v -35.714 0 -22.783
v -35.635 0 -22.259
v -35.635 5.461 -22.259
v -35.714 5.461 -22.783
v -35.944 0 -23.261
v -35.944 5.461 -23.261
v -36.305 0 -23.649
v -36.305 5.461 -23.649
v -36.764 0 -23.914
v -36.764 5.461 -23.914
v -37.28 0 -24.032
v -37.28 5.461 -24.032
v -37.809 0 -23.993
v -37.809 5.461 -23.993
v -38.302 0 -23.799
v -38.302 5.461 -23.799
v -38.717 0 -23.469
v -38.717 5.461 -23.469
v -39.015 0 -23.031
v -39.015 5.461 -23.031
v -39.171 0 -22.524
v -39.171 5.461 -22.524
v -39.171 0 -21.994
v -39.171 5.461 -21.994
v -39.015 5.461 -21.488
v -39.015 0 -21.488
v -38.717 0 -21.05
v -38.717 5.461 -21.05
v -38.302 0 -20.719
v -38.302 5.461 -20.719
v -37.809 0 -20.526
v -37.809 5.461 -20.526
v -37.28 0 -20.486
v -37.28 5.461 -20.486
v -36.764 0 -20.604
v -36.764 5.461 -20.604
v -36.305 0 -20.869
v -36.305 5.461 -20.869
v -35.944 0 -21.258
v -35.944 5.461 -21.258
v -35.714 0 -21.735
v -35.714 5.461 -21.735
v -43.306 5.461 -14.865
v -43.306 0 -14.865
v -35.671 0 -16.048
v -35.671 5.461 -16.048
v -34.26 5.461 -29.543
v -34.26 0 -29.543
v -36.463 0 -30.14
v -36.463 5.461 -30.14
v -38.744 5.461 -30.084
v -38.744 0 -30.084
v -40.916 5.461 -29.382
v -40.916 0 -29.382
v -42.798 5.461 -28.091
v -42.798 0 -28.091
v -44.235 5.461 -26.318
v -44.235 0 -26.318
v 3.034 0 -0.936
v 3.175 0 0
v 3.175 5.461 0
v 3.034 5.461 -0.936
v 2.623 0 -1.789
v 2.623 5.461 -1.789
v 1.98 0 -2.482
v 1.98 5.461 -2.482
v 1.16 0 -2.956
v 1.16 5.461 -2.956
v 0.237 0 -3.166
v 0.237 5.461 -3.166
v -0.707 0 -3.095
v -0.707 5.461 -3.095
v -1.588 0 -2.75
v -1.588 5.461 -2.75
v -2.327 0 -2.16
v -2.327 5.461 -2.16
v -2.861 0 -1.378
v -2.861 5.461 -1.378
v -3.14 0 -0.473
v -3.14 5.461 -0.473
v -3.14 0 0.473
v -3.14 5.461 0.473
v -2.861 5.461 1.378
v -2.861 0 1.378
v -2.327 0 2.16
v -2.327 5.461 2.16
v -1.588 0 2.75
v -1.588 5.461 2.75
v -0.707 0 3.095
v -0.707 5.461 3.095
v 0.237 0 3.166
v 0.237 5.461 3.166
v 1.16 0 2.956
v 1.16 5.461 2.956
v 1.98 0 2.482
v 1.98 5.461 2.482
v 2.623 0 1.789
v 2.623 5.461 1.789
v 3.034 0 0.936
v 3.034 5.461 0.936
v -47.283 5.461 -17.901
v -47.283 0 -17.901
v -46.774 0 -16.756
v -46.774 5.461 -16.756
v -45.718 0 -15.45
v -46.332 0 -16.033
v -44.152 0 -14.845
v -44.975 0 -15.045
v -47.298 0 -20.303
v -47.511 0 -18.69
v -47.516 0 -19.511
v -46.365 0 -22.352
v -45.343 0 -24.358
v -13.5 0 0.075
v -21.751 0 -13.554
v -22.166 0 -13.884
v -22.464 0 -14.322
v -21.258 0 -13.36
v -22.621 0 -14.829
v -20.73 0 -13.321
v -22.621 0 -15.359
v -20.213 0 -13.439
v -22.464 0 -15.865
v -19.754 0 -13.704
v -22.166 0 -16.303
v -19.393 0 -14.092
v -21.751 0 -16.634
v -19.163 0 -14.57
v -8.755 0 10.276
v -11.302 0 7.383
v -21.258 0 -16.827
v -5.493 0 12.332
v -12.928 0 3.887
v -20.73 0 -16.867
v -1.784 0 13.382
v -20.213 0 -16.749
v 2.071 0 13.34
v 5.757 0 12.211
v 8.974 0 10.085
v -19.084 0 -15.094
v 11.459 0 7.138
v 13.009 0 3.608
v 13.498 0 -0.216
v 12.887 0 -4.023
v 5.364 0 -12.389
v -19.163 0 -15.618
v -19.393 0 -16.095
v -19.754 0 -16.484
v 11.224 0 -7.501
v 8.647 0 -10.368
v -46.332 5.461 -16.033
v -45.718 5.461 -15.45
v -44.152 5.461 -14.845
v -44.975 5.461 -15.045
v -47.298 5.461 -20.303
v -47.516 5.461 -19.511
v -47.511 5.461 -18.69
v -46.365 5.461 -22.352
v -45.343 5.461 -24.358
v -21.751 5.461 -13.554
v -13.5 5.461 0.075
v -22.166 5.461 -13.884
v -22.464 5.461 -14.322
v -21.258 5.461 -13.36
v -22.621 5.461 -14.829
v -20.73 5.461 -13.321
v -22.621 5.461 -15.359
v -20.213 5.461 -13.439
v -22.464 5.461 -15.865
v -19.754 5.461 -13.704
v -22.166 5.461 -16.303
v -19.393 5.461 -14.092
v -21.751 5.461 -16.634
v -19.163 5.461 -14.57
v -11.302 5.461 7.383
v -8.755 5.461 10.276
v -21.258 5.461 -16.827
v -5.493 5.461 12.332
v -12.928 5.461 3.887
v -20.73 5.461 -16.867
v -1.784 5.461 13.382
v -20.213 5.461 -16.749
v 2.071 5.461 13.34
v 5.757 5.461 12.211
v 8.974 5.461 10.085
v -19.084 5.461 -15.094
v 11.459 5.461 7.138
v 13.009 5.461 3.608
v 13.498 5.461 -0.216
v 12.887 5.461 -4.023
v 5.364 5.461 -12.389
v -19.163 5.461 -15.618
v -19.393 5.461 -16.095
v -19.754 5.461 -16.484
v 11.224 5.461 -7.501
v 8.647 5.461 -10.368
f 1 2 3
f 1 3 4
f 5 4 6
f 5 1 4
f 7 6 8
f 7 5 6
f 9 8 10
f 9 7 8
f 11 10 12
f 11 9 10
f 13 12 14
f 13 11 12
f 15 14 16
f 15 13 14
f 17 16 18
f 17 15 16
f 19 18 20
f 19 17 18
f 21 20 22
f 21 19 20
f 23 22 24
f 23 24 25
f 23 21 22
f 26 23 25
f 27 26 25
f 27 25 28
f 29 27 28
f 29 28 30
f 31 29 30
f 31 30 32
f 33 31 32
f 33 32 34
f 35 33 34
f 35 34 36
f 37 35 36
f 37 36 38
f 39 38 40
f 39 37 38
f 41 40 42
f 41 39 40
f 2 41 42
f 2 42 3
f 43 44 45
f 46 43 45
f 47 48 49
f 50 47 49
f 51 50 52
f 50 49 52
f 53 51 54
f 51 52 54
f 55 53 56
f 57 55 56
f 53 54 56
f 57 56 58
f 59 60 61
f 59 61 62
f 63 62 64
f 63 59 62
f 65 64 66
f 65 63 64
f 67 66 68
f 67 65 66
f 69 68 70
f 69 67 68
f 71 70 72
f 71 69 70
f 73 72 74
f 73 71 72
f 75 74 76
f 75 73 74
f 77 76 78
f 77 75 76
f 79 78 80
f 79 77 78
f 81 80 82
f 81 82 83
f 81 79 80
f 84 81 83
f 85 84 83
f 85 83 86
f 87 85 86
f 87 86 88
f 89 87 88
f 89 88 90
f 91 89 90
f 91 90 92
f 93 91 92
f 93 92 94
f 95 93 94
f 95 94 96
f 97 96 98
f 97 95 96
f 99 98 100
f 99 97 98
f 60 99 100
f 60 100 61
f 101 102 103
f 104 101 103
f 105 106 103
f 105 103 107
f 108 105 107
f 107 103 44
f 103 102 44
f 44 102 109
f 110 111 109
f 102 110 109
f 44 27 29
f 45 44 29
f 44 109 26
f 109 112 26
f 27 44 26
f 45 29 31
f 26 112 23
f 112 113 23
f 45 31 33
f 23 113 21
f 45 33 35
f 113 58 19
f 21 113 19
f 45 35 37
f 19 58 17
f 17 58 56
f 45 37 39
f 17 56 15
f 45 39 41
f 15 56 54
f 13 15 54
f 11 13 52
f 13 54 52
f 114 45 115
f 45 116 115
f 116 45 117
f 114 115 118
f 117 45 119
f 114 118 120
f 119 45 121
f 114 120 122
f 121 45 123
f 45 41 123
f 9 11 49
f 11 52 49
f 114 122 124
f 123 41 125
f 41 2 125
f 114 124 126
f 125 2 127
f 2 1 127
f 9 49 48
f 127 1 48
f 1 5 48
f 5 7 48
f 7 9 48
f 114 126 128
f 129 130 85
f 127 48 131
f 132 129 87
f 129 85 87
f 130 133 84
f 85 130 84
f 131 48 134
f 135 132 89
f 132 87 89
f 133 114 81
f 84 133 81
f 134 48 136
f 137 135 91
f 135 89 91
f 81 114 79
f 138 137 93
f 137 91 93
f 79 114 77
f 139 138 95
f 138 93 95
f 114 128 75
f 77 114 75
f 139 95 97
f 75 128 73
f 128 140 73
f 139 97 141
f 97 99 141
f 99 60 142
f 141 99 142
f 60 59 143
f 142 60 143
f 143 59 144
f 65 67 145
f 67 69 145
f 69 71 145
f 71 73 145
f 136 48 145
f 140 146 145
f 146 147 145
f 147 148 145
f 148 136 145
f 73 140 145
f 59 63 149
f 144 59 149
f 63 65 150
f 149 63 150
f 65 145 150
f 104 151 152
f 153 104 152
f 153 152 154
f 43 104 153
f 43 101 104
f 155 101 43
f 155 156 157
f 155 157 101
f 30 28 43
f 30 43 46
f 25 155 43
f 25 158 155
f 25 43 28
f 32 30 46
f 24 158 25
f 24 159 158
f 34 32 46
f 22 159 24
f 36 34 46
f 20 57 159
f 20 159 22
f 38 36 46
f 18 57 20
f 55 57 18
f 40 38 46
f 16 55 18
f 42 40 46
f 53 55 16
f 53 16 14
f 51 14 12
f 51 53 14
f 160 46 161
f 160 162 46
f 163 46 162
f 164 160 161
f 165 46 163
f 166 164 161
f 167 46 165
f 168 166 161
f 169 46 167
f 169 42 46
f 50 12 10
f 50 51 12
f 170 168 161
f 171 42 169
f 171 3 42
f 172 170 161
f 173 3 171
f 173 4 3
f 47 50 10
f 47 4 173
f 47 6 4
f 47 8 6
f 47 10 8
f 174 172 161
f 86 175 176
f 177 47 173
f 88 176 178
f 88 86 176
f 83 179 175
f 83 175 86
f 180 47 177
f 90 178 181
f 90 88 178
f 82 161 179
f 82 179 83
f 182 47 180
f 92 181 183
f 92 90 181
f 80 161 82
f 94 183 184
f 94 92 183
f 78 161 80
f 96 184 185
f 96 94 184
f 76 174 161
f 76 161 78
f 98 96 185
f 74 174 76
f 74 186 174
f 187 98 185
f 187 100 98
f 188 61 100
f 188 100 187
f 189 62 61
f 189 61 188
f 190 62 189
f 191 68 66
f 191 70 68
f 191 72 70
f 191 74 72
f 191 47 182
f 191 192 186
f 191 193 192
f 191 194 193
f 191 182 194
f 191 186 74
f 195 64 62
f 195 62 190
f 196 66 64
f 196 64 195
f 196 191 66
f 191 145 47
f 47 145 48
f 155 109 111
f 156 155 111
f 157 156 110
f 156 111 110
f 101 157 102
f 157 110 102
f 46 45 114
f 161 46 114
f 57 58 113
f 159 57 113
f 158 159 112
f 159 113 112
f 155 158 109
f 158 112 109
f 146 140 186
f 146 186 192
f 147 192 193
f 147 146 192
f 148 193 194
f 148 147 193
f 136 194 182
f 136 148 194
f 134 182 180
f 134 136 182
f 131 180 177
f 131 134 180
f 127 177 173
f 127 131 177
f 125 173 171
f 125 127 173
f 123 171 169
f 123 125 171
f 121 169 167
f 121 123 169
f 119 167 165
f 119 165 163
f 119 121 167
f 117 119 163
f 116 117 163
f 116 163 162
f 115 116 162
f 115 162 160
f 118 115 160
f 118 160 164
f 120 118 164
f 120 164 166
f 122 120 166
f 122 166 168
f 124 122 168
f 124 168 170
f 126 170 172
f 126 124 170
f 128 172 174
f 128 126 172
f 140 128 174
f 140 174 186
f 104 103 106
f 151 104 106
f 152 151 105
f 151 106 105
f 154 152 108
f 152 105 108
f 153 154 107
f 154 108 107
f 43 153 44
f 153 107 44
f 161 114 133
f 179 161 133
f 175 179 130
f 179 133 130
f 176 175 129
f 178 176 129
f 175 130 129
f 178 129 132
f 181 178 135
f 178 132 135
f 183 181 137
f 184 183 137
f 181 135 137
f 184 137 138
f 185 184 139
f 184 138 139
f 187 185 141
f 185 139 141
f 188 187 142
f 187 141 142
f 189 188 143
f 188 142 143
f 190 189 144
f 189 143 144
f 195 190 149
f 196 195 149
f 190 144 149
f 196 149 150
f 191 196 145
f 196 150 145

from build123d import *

# Parameters (mm, degrees)
SKETCH1_R           = 1.778
SKETCH1_R_2         = 3.175
BOSS_EXTRUDE1_DEPTH = 5.461


with BuildPart() as part:
    # Sketch1 → Boss-Extrude1 (new body)
    with BuildSketch(Plane(origin=(0, 0, 0), x_dir=(1, 0, 0), z_dir=(0, 1, 0))):
        with BuildLine():
            Line((-35.671169379, 16.048164087), (-13.499793526, -0.074664302))
            ThreePointArc((-13.499793526, -0.074664302), (7.44200849, -11.263503435), (5.363638877, 12.388760148))
            Line((5.363638877, 12.388760148), (-34.259632886, 29.543416329))
            ThreePointArc((-34.259632886, 29.543416329), (-39.855484626, 29.811728531), (-44.234733225, 26.317772344))
            ThreePointArc((-44.234733225, 26.317772344), (-45.865213893, 23.360627542), (-47.298283286, 20.302934833))
            ThreePointArc((-47.298283286, 20.302934833), (-47.541465806, 19.100109045), (-47.282683039, 17.900542834))
            Line((-47.282683039, 17.900542834), (-46.773518475, 16.755633062))
            ThreePointArc((-46.773518475, 16.755633062), (-45.359998522, 15.22299407), (-43.306077078, 14.864626044))
            Line((-43.306077078, 14.864626044), (-35.671169379, 16.048164087))
        make_face()
        with Locations((-20.862458922, 15.093717491)):
            Circle(SKETCH1_R, mode=Mode.SUBTRACT)
        Circle(SKETCH1_R_2, mode=Mode.SUBTRACT)
        with Locations((-37.413253893, 22.259284205)):
            Circle(SKETCH1_R, mode=Mode.SUBTRACT)
    extrude(amount=BOSS_EXTRUDE1_DEPTH)


solid = part.part
